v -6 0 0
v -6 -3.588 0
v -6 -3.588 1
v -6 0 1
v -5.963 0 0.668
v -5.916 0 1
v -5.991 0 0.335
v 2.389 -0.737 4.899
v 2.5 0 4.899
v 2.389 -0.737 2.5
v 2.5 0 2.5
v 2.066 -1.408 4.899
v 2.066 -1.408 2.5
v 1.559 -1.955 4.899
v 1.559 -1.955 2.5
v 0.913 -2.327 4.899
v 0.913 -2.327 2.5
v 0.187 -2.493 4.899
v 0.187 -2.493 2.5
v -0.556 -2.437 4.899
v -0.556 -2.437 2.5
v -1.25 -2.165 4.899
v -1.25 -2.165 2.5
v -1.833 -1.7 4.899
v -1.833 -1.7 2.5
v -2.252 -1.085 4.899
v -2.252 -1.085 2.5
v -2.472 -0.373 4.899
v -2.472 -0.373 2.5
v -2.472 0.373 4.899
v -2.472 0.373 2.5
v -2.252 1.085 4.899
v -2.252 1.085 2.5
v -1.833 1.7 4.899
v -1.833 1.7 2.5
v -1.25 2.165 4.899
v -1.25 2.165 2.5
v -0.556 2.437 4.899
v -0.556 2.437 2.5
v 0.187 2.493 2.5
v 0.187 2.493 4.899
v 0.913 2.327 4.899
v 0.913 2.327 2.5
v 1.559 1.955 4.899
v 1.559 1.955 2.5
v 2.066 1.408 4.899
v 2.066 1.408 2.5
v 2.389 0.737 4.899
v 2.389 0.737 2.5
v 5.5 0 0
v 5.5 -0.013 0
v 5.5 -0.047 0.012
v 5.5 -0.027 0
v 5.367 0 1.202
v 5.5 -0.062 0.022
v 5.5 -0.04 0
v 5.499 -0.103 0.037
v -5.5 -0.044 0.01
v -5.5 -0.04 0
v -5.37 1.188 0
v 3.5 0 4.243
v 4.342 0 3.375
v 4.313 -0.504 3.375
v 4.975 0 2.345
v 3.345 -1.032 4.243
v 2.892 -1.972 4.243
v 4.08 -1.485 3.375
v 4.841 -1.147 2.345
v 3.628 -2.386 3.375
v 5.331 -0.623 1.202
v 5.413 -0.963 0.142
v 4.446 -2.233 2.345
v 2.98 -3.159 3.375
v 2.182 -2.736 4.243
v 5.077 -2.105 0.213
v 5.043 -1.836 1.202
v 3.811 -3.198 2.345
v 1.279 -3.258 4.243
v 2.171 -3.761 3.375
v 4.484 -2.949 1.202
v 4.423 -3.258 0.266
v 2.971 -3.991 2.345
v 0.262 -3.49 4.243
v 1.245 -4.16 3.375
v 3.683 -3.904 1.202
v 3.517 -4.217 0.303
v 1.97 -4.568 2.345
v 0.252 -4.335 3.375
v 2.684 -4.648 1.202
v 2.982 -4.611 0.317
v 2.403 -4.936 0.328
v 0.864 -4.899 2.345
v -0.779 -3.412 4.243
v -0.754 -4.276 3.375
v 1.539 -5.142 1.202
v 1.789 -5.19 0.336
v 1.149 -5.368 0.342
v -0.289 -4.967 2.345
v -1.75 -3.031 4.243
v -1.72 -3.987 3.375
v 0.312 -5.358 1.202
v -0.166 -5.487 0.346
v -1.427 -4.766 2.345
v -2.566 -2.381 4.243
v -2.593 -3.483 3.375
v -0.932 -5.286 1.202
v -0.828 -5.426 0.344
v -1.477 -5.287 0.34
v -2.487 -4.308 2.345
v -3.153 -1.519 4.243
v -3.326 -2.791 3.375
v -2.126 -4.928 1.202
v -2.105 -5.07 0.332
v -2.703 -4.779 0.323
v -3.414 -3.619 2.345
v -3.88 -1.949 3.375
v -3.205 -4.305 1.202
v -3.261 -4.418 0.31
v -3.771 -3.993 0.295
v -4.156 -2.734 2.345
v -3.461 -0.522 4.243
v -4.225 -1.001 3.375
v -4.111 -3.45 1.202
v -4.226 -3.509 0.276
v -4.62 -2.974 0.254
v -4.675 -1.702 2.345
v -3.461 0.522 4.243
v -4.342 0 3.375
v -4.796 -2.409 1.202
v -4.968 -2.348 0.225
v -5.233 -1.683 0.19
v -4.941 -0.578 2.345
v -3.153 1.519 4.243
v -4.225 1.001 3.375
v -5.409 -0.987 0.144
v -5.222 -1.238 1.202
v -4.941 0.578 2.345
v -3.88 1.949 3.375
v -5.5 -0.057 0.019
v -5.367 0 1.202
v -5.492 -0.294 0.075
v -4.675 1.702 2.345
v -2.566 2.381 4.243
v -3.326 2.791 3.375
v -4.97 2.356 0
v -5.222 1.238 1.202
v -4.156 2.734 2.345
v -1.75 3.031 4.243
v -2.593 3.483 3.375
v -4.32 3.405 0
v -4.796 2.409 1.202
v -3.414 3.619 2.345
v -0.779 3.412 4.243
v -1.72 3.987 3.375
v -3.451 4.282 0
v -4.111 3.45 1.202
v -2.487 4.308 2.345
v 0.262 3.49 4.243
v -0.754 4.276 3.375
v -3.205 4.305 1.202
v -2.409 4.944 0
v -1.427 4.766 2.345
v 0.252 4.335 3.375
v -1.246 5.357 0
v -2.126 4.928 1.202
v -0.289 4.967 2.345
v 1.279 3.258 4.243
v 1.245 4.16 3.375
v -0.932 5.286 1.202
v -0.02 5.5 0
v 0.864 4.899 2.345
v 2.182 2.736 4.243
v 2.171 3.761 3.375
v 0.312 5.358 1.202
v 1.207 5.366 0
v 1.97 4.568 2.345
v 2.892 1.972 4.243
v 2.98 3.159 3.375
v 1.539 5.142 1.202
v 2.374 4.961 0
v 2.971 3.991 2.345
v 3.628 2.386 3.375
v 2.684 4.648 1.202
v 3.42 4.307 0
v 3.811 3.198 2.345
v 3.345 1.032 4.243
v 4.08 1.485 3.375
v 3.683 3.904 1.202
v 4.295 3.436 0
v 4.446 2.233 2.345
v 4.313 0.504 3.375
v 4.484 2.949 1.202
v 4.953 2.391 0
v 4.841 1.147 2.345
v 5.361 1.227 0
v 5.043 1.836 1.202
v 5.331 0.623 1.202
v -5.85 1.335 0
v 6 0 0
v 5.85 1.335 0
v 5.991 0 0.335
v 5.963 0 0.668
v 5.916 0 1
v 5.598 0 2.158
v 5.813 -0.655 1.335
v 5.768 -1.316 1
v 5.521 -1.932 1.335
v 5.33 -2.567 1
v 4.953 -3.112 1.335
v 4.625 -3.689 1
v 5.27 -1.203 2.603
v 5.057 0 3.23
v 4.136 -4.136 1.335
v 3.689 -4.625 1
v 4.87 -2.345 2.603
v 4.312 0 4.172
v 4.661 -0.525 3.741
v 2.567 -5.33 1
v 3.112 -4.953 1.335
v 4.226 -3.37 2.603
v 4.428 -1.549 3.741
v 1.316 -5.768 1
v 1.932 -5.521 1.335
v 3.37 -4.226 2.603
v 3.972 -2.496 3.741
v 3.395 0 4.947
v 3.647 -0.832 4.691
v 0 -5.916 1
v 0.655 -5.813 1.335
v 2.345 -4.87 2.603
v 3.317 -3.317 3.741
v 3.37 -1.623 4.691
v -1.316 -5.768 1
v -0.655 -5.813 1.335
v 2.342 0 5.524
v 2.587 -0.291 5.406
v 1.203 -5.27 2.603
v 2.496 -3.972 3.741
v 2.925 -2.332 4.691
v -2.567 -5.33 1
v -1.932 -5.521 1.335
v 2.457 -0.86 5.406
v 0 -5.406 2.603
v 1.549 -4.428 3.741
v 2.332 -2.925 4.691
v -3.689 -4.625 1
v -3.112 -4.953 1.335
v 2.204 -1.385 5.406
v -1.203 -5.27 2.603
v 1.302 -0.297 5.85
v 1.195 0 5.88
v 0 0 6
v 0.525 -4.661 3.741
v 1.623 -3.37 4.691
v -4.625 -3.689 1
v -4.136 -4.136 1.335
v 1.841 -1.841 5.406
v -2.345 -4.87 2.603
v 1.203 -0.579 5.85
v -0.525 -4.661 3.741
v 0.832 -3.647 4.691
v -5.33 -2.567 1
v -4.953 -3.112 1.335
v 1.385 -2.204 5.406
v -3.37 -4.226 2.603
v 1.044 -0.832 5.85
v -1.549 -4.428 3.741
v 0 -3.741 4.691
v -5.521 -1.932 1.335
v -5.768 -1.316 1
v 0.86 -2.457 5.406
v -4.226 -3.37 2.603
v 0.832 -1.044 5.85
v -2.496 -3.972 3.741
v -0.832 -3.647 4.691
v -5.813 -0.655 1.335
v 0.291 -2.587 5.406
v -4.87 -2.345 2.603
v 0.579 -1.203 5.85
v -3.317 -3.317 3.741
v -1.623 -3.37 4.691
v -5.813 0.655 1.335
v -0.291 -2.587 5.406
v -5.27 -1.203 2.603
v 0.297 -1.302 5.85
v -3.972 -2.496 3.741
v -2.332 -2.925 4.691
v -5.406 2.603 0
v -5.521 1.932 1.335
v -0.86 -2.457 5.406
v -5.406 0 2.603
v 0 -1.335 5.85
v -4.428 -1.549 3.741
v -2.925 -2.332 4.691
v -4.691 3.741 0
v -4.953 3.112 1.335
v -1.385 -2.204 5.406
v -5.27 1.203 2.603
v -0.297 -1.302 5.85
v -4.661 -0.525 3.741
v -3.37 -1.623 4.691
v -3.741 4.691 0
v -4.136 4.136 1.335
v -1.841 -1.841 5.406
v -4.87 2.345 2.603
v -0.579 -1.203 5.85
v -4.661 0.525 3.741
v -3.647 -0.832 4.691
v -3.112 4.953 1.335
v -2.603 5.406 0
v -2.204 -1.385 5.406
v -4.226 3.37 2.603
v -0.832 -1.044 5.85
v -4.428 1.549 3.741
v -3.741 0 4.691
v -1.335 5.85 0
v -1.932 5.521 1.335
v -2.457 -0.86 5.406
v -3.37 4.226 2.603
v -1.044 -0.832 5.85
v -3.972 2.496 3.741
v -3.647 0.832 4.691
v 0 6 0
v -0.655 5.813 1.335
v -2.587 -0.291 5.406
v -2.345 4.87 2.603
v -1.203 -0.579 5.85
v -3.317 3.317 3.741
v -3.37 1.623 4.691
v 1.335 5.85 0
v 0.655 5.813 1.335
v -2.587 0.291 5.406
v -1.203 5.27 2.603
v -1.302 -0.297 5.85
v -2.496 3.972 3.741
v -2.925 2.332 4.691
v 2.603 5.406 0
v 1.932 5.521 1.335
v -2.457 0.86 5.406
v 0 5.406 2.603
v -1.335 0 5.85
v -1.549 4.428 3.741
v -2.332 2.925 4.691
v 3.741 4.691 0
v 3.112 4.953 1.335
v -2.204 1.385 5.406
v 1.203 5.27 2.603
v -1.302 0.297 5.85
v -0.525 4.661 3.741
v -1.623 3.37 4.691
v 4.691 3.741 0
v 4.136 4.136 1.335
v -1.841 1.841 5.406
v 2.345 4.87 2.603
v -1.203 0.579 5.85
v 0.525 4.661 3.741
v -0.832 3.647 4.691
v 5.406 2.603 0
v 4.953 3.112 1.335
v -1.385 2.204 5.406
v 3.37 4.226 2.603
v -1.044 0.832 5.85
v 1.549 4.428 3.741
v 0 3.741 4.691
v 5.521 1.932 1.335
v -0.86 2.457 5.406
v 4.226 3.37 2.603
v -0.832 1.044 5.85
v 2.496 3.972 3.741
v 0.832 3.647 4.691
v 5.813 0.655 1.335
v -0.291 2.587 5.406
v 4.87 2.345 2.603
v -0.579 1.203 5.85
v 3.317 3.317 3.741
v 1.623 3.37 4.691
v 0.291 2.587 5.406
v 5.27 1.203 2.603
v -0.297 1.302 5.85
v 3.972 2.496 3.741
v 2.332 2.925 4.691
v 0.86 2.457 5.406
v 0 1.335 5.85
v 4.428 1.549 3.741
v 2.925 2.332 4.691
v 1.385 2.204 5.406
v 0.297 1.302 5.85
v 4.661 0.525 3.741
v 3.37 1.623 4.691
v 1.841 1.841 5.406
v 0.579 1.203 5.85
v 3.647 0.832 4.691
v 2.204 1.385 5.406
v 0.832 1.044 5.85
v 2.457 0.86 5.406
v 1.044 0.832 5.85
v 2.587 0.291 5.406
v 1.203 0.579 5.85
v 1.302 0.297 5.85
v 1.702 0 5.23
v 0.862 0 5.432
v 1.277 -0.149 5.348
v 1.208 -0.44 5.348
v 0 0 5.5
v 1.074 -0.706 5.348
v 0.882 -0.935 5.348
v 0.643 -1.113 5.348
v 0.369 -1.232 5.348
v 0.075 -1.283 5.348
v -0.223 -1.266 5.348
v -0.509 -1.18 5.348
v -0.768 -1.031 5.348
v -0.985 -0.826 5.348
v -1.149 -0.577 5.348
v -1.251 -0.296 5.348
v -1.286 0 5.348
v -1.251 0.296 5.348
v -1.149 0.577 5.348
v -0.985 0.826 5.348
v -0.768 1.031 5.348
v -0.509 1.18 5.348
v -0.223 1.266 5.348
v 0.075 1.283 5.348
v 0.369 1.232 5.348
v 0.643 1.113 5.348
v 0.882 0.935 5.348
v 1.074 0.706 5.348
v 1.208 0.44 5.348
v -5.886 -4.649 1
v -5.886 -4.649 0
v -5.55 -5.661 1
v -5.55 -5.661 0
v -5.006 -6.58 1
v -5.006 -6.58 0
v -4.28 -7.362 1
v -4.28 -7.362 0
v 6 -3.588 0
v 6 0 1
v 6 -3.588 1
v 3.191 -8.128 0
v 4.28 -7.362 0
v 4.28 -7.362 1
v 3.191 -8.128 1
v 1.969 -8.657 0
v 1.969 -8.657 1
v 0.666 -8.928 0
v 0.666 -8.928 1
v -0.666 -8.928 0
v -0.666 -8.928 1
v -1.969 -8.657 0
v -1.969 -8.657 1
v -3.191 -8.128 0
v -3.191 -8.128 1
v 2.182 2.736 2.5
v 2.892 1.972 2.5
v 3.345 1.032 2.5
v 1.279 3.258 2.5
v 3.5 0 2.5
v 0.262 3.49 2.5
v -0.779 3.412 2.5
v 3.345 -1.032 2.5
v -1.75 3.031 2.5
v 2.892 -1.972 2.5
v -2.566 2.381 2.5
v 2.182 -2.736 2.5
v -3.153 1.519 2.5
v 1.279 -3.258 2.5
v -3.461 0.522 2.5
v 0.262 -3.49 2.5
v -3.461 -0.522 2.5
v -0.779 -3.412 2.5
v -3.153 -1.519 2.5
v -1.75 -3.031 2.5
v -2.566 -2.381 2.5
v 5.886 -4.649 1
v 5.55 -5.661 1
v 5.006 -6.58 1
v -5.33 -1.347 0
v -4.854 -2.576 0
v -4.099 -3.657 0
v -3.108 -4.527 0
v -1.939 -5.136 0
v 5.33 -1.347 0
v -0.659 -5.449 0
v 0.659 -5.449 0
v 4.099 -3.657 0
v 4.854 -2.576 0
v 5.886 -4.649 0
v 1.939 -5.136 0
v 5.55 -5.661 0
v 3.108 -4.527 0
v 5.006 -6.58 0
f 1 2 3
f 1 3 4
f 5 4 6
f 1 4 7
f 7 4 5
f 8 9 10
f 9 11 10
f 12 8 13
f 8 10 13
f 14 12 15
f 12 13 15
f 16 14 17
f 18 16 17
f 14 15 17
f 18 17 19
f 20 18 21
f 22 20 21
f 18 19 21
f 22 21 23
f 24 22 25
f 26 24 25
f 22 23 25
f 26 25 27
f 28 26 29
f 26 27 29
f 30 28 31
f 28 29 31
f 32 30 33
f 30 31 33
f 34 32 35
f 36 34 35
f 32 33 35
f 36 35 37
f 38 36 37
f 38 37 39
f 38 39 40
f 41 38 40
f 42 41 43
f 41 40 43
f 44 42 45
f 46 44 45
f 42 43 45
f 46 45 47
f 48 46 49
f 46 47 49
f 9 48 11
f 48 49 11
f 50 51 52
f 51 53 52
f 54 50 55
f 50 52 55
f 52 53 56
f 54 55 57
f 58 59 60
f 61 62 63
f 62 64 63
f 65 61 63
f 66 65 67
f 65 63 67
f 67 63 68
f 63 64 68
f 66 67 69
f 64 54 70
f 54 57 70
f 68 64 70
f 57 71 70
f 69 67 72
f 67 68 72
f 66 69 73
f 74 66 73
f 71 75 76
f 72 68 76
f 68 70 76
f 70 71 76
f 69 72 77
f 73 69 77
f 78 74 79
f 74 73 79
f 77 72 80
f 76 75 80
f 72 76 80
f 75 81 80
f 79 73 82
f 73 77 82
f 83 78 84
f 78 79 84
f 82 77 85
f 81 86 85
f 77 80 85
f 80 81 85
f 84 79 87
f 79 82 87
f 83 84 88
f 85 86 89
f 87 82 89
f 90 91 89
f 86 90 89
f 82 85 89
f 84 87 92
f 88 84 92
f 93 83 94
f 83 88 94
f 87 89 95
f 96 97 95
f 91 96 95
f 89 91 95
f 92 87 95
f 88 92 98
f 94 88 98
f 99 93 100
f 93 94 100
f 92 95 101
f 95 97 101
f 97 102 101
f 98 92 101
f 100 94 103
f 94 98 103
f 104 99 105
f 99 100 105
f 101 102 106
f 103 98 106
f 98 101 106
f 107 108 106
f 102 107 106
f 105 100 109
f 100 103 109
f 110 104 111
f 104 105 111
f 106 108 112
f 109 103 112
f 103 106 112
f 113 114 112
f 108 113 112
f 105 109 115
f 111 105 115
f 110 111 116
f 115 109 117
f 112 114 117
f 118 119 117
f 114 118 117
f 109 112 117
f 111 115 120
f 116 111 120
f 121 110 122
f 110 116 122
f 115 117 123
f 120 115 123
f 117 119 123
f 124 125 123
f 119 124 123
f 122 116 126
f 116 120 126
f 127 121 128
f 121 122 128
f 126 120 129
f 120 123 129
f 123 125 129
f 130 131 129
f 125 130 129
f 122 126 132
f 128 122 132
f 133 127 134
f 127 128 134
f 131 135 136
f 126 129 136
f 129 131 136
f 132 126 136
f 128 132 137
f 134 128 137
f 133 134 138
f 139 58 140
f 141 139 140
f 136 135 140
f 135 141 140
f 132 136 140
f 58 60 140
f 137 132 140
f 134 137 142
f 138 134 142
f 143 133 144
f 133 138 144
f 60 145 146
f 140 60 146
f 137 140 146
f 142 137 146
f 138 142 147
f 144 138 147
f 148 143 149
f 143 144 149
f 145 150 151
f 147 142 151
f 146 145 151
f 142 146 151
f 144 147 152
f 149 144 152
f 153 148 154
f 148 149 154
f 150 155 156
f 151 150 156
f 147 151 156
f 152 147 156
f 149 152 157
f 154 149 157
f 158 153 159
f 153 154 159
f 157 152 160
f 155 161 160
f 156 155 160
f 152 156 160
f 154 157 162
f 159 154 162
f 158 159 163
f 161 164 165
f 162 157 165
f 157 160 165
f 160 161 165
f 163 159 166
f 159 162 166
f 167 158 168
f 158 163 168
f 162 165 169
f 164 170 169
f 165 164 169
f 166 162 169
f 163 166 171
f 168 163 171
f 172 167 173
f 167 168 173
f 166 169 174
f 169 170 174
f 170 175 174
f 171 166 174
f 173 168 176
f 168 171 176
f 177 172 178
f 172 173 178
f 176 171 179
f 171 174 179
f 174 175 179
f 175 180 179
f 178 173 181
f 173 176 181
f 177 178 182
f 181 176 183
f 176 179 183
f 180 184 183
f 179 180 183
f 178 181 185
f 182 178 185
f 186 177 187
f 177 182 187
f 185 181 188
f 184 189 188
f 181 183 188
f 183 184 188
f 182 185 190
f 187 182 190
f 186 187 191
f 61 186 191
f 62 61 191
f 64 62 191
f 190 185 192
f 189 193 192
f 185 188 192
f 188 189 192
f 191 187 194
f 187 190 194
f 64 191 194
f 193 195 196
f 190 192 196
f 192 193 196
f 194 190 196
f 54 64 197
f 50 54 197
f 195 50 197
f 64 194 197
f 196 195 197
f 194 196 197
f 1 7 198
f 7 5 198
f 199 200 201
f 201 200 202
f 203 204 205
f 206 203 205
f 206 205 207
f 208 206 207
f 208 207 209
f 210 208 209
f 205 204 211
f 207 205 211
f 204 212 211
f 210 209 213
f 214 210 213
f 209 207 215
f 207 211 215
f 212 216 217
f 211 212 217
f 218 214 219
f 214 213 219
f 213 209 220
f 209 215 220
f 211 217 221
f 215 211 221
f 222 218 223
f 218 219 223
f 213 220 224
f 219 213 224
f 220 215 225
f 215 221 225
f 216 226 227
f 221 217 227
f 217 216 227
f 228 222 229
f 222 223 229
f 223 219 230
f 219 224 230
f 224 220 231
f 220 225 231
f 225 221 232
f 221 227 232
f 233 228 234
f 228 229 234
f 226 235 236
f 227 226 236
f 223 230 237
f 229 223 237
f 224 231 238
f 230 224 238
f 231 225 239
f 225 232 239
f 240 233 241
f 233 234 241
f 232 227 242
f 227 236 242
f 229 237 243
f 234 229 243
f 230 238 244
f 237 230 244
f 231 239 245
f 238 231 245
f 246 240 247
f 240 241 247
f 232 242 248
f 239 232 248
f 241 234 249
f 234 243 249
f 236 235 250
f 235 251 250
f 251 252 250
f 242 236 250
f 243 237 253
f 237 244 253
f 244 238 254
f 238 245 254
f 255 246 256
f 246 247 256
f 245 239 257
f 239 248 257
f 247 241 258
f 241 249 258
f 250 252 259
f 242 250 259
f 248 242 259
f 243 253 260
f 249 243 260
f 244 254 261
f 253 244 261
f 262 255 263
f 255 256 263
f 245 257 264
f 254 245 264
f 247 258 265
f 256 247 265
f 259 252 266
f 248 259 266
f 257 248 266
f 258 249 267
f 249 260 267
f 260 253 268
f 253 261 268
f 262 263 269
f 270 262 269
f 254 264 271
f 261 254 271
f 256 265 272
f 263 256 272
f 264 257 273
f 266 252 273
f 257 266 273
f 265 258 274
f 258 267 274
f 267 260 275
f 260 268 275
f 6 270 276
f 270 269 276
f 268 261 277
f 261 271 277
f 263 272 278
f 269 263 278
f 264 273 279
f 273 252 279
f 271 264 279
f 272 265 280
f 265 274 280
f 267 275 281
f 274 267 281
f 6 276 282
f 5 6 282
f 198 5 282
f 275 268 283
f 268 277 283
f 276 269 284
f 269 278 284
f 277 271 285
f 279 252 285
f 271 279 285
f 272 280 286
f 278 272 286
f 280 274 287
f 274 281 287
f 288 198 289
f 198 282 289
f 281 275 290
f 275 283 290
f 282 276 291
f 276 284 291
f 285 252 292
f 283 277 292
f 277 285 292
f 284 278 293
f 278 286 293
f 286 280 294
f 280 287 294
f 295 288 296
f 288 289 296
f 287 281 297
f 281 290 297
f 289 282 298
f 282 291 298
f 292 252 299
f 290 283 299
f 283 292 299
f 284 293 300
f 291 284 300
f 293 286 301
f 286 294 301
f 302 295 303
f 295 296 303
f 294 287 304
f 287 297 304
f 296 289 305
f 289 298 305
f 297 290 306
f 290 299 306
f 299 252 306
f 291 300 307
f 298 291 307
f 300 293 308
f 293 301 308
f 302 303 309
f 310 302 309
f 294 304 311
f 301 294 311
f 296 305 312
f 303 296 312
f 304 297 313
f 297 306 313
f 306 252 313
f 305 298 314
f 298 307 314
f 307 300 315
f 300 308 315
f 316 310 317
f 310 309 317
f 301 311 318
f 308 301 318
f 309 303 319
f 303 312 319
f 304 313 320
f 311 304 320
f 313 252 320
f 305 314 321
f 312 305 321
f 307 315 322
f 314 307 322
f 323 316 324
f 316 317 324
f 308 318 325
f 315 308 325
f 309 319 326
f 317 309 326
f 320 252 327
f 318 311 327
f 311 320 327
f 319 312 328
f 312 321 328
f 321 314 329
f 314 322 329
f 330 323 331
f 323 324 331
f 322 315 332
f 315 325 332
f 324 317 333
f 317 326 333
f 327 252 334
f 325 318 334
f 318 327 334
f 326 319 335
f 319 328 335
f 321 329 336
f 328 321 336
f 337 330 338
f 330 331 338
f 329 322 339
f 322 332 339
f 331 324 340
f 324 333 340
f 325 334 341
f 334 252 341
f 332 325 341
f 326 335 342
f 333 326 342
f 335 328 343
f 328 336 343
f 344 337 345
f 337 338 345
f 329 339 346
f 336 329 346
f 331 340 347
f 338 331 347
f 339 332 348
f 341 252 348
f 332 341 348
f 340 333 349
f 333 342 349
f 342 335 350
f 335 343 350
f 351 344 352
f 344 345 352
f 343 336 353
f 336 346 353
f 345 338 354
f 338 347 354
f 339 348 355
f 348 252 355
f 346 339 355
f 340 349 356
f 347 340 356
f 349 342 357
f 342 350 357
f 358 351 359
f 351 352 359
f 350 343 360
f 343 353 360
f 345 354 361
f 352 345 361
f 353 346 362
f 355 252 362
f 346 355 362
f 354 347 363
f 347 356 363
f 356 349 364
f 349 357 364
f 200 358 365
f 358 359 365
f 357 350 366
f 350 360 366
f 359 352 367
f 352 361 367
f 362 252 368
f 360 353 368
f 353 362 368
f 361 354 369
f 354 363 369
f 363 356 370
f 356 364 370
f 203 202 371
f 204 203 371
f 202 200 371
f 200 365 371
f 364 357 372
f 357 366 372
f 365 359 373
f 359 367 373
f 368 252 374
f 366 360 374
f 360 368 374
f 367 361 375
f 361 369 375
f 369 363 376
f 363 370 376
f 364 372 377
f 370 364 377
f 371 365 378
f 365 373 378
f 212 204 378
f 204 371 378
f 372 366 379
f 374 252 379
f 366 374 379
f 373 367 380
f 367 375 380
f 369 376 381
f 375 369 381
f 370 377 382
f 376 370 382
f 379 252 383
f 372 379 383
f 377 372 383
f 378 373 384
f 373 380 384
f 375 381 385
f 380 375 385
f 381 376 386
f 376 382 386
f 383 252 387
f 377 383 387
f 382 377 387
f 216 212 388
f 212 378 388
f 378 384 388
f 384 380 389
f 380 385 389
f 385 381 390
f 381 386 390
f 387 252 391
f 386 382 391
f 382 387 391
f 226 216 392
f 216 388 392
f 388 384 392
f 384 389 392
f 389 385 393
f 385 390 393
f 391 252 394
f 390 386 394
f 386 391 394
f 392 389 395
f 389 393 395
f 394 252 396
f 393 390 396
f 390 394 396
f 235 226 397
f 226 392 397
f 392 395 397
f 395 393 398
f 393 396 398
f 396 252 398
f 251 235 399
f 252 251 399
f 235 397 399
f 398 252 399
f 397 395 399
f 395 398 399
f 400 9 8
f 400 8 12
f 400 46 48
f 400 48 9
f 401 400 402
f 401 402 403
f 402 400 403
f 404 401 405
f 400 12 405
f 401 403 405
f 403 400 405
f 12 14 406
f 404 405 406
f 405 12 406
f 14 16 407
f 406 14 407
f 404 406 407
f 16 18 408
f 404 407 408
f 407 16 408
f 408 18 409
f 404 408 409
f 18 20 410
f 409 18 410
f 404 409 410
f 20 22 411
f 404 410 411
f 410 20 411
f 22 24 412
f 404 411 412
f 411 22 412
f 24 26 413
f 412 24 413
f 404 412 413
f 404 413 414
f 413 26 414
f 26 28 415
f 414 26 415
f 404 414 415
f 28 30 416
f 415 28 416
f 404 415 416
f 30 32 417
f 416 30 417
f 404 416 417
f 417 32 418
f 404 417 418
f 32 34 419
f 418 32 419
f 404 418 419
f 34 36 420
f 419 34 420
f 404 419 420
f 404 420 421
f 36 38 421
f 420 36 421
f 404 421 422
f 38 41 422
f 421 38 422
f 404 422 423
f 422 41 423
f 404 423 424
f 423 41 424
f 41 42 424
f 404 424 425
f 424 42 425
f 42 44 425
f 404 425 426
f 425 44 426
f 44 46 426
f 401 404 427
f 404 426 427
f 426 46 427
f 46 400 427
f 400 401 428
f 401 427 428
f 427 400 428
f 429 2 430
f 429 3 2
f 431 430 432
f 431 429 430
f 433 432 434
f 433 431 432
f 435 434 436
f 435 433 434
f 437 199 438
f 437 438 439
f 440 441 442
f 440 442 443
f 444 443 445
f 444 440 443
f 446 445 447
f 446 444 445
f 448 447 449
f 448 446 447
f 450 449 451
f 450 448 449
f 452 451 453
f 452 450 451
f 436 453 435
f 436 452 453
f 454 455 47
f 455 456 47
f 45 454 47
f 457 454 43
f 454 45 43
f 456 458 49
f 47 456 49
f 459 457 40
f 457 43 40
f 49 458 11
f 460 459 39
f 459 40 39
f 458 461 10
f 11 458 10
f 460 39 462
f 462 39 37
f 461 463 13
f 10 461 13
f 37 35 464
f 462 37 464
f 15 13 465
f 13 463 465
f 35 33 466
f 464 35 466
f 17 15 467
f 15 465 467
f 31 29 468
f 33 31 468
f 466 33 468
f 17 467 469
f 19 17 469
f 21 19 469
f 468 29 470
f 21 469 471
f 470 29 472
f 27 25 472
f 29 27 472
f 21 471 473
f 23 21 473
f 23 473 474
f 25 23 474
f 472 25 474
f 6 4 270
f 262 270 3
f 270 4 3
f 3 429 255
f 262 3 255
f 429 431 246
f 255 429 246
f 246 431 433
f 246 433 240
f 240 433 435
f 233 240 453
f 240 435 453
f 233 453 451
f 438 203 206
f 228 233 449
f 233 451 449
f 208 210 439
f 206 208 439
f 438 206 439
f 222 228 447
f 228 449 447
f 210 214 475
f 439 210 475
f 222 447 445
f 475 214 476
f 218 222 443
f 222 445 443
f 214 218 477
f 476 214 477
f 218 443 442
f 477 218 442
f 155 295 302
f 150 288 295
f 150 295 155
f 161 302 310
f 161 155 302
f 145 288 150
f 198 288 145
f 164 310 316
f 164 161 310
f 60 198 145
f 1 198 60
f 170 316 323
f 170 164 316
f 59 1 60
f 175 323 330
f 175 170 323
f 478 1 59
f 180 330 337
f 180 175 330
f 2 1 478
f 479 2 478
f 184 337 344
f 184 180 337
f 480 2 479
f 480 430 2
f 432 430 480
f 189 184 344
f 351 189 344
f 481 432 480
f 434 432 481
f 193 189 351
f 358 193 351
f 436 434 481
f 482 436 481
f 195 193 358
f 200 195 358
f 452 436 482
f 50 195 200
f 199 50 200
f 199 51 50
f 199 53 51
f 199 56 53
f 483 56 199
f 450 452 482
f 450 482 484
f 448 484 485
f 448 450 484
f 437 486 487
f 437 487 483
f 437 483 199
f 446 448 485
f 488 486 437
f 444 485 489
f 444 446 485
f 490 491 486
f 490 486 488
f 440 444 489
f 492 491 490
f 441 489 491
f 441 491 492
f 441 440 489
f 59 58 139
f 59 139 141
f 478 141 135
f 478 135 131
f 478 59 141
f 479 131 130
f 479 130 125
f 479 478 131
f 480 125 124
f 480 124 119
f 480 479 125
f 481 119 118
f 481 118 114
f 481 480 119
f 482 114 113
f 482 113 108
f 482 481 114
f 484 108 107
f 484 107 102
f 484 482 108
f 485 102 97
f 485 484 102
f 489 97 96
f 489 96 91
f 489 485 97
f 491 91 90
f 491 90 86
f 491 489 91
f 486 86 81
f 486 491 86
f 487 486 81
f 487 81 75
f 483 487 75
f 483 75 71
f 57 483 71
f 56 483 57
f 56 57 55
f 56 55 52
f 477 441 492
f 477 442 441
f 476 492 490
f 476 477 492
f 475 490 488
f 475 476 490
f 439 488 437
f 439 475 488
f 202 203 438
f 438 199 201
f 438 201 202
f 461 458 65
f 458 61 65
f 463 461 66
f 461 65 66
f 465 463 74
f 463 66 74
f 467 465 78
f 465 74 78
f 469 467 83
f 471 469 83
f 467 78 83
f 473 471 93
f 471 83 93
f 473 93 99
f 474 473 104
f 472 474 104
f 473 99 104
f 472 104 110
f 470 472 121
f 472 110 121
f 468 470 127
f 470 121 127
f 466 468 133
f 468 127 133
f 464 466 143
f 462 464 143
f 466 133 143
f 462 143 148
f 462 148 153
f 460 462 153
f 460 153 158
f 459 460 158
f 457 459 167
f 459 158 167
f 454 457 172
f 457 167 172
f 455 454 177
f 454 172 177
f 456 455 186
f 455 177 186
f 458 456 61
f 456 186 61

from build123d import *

# Parameters (mm, degrees)
F3_DEPTH = 1
F4_R     = 5


with BuildPart() as f1:
    # F0 (on Front) → F1 (revolve)
    with BuildSketch(Plane.XZ):
        with BuildLine():
            Line((5.5, 0), (6, 0))
            ThreePointArc((6, 0), (4.2426406871, 4.2426406871), (0, 6))
            Line((0, 6), (0, 5.5))
            ThreePointArc((0, 5.5), (1.2856151892, 5.3476343915), (2.5, 4.8989794856))
            ThreePointArc((2.5, 4.8989794856), (3.0178958157, 4.5980762114), (3.5, 4.2426406871))
            ThreePointArc((3.5, 4.2426406871), (4.9749371855, 2.3452078799), (5.5, 0))
        make_face()
        with BuildLine():
            Line((3.5, 2.5), (3.5, 4.2426406871))
            ThreePointArc((3.5, 4.2426406871), (3.0178958157, 4.5980762114), (2.5, 4.8989794856))
            Line((2.5, 4.8989794856), (2.5, 2.5))
            Line((2.5, 2.5), (3.5, 2.5))
        make_face()
    revolve(axis=Axis((0, 0, 3), (0, 0, -1)))

    # F2 (on face) → F3 (join)
    with BuildSketch(Plane(origin=(0, 0, 0), x_dir=(1, 0, 0), z_dir=(0, 0, -1))):
        with BuildLine():
            Line((-6.0000796802, 5), (-6.0000796802, 0))
            Line((-6.0000796802, 0), (-5.5000796802, 0))
            ThreePointArc((-5.5000796802, 0), (0, 5.4891055059), (5.5000796802, 0))
            Line((5.5000796802, 0), (6.0000796802, 0))
            Line((6.0000796802, 0), (6.0000796802, 5))
            ThreePointArc((6.0000796802, 5), (0, 8.9616150573), (-6.0000796802, 5))
        make_face()
    extrude(amount=-F3_DEPTH)

    # F4
    f4_edges = [f1.edges().sort_by_distance(p)[0] for p in [
        (6.00008, -5, 0.5),
        (-6.00008, -5, 0.5),
    ]]
    fillet(f4_edges, radius=F4_R)


solid = f1.part
